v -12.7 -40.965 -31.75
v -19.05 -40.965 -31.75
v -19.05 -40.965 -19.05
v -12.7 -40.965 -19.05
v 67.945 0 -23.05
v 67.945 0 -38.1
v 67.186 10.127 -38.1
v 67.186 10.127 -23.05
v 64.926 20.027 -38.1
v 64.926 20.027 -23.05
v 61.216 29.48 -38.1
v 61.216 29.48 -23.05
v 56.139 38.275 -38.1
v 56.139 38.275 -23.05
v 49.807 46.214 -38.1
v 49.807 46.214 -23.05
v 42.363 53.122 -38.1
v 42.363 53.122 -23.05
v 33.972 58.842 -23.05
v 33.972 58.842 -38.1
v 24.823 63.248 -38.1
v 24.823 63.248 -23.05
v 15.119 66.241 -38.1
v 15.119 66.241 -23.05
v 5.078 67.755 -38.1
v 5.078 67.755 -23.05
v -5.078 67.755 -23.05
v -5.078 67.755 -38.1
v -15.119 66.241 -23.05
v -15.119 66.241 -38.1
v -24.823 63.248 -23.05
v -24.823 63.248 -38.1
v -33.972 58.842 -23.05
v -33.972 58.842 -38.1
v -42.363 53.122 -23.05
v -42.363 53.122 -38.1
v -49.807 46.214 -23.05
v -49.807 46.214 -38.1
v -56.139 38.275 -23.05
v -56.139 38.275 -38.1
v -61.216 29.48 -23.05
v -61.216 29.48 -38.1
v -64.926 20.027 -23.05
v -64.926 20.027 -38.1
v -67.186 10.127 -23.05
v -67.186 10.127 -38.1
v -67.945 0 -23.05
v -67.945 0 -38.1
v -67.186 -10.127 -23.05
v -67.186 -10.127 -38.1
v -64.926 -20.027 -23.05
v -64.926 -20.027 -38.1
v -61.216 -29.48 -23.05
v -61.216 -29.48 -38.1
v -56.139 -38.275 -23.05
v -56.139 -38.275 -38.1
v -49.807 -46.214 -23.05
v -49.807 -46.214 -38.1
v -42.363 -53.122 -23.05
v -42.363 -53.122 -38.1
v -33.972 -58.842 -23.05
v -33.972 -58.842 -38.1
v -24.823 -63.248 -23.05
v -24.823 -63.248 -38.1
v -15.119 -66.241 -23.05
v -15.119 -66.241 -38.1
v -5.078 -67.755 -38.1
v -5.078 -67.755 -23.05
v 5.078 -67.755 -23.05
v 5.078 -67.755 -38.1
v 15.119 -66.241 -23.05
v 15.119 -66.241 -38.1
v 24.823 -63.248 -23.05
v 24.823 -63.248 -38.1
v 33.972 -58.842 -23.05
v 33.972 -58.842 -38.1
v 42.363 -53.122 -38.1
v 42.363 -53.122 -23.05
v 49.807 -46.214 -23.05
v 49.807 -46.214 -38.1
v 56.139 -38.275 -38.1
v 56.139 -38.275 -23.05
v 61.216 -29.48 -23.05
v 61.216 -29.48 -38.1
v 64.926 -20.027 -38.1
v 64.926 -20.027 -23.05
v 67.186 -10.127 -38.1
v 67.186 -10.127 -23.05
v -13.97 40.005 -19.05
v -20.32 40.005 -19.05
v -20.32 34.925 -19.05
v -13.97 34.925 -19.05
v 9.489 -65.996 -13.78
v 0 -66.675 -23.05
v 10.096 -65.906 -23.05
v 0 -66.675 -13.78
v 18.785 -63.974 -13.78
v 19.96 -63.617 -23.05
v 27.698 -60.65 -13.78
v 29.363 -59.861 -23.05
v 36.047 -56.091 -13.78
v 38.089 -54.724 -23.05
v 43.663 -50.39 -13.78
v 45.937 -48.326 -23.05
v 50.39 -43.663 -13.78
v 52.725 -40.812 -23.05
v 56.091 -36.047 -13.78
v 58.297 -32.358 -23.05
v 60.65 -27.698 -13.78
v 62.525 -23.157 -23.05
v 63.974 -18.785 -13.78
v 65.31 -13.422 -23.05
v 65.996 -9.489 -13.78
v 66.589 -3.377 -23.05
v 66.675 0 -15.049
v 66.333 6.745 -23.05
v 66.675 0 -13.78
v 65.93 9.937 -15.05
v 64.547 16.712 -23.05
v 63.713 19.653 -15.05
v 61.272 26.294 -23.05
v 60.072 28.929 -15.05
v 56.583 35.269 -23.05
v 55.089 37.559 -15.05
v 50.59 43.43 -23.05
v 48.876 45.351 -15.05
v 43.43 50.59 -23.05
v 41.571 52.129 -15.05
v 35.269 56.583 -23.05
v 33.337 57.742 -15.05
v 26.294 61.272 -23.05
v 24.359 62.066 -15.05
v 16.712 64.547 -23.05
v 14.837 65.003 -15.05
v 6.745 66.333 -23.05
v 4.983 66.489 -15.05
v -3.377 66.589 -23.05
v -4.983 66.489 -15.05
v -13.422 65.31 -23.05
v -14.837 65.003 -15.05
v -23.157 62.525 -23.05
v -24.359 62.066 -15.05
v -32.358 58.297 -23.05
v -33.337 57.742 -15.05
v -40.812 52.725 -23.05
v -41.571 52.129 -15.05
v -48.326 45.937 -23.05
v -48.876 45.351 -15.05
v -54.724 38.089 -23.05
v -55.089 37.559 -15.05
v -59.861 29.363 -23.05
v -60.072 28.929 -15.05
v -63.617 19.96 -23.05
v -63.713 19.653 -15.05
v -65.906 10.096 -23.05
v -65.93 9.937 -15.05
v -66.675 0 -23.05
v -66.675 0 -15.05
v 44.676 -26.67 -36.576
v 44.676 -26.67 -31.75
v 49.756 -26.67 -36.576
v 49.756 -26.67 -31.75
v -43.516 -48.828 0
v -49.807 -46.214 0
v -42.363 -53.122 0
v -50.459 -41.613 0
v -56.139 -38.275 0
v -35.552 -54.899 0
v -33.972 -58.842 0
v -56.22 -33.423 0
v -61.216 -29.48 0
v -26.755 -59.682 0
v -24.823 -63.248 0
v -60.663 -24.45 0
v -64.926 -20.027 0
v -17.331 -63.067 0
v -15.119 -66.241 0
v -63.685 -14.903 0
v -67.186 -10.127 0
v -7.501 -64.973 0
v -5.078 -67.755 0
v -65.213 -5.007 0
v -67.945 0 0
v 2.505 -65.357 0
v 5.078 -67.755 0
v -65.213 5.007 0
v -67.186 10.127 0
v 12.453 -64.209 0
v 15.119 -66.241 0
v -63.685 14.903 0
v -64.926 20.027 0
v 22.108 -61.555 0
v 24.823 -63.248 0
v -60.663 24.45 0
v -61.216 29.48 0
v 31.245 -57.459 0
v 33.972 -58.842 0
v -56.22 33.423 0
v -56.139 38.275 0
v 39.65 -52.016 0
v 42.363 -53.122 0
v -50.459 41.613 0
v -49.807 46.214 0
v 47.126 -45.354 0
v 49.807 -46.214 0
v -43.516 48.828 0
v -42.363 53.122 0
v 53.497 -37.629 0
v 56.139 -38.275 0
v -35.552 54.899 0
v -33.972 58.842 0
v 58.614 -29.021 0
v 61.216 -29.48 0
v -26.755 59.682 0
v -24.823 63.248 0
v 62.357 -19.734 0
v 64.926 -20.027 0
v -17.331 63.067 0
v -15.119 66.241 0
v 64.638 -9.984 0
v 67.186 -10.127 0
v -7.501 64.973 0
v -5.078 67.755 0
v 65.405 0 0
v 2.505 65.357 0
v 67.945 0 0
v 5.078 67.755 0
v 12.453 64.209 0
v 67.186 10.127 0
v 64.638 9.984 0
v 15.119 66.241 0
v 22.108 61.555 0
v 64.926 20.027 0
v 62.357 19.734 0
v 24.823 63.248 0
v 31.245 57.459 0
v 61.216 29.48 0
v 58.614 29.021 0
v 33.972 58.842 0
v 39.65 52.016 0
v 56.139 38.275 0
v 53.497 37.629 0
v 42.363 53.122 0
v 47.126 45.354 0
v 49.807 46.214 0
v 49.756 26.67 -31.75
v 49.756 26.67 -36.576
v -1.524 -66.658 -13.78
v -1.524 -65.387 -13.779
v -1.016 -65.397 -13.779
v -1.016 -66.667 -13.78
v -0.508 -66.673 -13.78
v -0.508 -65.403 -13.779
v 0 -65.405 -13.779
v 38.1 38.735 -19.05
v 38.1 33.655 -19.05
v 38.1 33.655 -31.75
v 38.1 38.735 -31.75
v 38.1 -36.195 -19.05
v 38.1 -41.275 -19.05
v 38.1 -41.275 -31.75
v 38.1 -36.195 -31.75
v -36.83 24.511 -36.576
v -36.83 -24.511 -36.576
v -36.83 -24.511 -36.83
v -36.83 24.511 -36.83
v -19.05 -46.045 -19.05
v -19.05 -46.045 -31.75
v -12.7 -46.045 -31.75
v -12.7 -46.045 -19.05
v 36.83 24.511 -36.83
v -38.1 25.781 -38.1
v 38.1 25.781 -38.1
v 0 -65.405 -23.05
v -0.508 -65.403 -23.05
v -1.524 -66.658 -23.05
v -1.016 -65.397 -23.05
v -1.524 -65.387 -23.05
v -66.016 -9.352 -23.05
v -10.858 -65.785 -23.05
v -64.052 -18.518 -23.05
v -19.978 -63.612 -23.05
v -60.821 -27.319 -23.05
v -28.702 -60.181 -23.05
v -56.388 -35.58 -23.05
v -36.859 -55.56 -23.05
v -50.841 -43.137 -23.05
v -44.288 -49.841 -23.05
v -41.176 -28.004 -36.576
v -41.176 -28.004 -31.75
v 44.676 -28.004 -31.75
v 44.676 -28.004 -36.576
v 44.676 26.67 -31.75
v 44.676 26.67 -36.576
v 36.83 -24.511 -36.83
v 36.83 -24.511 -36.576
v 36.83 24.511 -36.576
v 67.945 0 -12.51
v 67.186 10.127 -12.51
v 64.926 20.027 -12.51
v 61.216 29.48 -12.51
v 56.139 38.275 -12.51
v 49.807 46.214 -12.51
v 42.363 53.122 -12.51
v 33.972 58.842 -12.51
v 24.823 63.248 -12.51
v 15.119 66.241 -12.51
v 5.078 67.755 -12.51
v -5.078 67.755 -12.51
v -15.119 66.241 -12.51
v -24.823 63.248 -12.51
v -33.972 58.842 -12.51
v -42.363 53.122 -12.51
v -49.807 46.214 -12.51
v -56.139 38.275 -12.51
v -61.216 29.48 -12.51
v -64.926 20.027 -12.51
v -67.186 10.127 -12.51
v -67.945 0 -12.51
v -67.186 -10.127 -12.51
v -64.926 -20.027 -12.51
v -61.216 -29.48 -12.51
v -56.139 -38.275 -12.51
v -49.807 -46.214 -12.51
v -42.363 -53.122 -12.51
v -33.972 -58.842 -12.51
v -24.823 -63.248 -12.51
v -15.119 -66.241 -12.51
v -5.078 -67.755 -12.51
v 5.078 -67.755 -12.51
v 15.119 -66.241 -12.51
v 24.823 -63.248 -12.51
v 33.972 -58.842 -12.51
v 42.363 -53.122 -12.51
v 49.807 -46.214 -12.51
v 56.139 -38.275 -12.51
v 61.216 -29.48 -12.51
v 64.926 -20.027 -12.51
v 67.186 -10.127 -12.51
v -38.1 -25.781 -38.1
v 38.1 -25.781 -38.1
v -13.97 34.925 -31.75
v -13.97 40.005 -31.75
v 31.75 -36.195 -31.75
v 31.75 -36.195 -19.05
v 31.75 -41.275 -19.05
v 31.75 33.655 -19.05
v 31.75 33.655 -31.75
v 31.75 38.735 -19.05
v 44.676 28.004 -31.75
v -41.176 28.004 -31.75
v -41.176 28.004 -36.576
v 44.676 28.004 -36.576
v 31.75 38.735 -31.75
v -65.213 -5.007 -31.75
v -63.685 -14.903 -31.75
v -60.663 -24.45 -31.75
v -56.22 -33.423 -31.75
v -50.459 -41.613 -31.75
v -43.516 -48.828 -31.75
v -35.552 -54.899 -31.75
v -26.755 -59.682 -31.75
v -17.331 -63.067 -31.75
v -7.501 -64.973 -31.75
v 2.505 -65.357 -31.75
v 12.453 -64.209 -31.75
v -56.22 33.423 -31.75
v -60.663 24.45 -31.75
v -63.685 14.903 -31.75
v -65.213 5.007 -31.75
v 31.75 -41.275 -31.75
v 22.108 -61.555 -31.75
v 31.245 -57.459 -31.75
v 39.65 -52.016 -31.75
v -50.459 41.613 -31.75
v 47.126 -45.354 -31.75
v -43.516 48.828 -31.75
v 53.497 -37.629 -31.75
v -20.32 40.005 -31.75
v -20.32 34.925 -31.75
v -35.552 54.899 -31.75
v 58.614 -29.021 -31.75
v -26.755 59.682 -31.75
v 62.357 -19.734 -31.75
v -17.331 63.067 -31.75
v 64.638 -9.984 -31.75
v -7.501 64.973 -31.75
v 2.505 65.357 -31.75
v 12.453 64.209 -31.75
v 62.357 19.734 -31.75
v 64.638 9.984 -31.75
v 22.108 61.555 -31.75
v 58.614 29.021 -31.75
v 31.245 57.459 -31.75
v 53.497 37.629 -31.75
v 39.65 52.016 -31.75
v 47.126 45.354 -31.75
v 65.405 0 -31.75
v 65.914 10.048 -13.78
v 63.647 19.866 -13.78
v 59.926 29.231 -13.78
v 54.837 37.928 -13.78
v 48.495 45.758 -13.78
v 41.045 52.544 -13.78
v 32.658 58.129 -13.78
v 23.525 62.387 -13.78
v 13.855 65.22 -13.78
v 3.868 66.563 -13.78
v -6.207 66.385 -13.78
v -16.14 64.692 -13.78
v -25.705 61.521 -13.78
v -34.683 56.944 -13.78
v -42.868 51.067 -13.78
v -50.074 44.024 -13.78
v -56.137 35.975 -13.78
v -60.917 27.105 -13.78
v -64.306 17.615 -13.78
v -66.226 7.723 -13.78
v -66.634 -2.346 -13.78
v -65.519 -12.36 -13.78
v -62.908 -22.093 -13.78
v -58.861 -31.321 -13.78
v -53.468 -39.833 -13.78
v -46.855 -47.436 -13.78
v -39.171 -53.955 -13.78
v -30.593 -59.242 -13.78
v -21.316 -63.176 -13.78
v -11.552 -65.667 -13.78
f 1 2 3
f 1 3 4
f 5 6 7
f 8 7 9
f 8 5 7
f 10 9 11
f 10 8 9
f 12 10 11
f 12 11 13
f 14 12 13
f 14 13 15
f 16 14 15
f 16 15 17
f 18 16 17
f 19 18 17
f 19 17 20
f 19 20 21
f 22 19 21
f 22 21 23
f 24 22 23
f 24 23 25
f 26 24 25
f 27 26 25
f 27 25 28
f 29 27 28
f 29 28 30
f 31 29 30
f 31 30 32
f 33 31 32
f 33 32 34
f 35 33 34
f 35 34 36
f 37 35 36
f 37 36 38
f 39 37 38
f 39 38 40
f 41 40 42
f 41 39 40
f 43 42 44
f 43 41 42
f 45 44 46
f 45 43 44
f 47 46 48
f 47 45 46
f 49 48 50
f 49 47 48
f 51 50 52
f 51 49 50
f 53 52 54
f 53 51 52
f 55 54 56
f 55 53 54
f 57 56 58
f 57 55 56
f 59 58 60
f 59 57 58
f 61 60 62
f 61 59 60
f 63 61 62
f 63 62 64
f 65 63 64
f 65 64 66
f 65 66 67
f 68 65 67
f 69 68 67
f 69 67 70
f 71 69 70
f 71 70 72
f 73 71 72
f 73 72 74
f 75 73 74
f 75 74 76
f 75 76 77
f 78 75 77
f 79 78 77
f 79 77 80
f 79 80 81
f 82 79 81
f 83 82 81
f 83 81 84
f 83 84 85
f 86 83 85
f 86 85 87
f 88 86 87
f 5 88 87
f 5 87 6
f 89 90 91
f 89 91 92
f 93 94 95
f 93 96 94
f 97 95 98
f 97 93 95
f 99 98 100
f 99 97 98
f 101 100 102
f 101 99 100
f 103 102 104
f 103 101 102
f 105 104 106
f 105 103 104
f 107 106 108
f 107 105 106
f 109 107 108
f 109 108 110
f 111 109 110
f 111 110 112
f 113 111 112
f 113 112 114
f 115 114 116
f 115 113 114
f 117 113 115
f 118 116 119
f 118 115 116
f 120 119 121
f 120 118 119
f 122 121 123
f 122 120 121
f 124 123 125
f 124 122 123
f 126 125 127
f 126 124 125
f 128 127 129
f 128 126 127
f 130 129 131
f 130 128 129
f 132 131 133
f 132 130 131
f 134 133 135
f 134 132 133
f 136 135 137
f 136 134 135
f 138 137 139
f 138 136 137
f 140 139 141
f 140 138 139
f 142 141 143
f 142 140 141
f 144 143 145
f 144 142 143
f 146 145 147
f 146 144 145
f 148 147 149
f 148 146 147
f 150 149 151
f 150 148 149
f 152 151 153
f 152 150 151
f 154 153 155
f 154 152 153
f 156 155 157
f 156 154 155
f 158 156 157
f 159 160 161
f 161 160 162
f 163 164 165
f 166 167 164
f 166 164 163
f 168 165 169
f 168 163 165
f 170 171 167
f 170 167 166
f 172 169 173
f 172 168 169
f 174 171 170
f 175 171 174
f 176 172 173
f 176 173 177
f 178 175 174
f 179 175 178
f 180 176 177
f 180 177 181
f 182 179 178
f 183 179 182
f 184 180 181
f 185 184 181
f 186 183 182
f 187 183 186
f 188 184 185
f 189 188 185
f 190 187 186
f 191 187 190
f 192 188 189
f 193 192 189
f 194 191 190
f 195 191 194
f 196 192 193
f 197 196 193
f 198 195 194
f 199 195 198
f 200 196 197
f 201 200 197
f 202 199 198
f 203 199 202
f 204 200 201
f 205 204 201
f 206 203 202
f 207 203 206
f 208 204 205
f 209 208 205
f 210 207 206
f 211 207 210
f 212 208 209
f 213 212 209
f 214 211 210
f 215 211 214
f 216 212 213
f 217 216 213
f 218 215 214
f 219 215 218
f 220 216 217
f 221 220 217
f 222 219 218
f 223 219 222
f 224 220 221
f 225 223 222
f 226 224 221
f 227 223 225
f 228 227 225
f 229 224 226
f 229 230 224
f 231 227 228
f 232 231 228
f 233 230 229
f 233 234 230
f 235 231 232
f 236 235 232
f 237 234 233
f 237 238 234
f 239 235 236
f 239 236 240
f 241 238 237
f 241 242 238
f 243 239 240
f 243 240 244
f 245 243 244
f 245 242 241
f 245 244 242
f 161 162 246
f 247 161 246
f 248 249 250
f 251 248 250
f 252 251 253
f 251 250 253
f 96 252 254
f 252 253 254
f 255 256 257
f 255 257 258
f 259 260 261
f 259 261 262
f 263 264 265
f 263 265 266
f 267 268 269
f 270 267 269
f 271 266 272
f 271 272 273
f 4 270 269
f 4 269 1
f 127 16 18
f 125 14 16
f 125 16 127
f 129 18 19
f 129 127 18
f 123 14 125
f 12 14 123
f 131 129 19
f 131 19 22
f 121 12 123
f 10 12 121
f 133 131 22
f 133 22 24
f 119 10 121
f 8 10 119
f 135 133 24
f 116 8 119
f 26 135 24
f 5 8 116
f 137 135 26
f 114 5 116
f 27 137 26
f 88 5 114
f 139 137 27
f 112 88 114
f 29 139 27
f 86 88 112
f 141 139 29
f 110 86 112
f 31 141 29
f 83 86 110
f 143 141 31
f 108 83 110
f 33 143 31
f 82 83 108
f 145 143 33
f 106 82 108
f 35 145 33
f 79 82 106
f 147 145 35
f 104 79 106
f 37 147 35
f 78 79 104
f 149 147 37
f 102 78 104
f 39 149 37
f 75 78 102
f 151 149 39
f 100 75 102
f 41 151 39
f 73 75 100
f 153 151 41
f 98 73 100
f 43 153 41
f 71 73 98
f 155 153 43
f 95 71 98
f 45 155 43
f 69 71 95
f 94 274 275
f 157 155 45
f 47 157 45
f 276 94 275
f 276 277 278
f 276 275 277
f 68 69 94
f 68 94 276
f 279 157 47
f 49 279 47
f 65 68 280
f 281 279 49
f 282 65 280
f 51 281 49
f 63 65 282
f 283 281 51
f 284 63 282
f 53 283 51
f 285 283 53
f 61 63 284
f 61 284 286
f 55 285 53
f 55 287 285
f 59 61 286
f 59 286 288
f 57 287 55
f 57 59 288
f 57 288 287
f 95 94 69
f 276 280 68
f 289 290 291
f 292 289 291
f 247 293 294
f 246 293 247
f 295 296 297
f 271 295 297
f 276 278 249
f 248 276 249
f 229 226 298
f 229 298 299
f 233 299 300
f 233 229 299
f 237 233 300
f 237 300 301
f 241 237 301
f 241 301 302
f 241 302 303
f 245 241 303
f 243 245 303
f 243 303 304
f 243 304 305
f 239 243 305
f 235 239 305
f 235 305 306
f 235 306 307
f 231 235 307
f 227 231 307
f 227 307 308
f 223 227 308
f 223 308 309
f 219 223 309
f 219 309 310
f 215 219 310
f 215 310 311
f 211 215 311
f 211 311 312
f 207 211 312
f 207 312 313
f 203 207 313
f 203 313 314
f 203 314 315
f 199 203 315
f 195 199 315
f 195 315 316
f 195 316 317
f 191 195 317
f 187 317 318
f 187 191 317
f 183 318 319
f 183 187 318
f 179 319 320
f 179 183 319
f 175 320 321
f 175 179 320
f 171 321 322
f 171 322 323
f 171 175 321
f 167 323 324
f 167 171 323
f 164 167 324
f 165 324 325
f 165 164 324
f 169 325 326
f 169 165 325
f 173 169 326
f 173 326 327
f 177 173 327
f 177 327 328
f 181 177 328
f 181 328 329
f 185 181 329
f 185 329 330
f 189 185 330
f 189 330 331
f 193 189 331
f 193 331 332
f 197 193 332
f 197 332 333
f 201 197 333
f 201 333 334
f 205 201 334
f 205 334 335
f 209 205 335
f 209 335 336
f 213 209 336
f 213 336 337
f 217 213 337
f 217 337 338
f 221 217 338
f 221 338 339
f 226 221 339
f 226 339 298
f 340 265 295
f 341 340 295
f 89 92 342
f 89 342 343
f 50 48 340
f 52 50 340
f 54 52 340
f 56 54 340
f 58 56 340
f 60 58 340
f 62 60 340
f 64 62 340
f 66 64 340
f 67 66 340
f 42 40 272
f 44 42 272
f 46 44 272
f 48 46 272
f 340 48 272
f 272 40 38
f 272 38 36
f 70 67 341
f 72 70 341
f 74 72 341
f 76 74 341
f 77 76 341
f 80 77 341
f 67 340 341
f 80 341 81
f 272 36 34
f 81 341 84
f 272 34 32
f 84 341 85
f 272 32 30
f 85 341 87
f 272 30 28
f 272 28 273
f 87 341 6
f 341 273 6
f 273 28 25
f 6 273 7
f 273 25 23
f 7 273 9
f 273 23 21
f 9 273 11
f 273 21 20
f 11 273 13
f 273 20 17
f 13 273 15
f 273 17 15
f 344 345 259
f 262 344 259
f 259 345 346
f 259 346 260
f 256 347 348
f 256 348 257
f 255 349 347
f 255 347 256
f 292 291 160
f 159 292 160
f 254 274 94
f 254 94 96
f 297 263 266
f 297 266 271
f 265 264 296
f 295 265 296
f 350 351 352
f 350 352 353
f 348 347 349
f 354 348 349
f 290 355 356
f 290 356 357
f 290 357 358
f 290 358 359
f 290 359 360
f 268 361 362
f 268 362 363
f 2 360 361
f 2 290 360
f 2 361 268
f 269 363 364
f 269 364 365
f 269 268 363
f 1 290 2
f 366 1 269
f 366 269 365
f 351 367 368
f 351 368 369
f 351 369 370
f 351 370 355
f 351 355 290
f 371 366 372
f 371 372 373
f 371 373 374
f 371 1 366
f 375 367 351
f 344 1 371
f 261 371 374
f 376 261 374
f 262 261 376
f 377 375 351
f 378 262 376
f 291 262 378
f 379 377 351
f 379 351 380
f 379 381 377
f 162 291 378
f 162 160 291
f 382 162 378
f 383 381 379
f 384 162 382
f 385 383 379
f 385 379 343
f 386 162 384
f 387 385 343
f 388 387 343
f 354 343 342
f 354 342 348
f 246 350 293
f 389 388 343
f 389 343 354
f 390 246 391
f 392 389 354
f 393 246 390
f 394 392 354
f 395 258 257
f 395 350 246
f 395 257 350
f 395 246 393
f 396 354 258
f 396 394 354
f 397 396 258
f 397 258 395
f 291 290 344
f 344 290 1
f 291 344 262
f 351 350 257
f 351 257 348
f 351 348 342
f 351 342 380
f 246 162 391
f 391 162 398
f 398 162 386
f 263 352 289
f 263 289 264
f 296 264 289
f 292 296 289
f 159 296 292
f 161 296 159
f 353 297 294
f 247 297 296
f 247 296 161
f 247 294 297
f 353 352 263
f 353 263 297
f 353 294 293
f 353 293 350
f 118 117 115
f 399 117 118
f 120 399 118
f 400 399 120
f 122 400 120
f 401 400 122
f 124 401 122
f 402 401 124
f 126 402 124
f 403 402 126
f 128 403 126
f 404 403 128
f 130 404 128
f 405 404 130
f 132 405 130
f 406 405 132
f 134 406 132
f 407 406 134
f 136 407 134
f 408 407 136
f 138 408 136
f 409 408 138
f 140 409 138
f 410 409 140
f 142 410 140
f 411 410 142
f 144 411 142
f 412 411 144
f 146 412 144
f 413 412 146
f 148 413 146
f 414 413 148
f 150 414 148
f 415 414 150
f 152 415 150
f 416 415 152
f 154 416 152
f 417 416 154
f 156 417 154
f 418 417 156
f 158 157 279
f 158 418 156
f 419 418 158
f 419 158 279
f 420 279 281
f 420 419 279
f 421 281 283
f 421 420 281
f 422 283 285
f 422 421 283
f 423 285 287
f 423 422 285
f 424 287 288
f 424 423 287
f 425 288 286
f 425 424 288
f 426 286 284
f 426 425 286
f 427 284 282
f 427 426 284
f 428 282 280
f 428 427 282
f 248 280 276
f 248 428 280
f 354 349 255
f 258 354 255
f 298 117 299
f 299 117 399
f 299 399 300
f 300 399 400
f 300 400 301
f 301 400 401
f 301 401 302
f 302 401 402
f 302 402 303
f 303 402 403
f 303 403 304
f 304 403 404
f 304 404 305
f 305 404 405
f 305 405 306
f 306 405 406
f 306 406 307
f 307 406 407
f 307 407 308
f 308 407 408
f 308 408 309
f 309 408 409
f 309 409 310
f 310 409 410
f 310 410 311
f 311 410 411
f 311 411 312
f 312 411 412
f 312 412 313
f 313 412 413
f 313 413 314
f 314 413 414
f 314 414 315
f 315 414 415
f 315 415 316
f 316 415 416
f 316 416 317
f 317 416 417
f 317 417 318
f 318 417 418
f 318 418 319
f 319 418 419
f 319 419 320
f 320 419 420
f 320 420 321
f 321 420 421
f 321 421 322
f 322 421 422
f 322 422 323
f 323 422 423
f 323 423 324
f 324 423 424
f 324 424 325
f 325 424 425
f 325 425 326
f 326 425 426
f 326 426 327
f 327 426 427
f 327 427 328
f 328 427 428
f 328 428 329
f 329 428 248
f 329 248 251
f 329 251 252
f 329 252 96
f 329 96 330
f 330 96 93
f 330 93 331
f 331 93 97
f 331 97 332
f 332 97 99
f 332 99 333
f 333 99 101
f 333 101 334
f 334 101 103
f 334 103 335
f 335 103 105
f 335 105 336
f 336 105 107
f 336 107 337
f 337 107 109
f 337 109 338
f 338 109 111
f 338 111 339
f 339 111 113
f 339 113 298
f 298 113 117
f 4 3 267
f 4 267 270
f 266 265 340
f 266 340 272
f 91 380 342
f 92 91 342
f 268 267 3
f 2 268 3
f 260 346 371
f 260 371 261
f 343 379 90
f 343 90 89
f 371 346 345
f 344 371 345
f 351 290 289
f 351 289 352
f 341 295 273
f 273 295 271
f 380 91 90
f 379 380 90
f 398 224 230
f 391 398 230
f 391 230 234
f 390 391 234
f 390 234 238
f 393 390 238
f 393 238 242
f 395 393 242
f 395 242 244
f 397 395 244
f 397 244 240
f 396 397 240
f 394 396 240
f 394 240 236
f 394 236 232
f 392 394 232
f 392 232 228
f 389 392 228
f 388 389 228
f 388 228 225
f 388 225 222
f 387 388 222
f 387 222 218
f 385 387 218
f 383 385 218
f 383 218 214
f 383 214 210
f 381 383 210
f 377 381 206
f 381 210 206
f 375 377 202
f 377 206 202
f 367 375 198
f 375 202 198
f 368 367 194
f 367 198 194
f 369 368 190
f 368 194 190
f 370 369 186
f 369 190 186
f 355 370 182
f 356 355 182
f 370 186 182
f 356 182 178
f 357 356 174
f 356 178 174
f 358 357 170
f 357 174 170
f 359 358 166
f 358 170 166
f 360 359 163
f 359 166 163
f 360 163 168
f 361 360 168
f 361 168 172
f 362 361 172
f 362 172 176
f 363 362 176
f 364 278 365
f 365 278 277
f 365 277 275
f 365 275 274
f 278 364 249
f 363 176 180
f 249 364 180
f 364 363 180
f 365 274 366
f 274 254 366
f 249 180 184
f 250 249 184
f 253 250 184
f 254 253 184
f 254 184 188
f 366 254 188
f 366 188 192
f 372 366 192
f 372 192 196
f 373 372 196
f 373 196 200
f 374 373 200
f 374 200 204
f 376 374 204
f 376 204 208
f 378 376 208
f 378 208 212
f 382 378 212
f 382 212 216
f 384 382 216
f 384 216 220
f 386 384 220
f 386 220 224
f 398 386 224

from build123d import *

# Parameters (mm, degrees)
F0_R        = 67.945
F1_DEPTH    = 38.1
F2_R        = 65.405
F3_DEPTH    = 31.75
F5_W        = 2.54
F5_H        = 8.001
F7_S5_R     = 66.675
F7_T6_DEPTH = 98
F8_W        = 73.66
F8_H        = 49.022
F9_DEPTH    = 6.351
F10_W       = 85.852
F10_H       = 56.007
F11_DEPTH   = 4.826
F12_W       = 5.08
F12_H       = 53.34
F13_DEPTH   = 4.826
F14_SIZE    = 1.27
F15_W       = 1.524
F15_H       = 9.271
F16_DEPTH   = 67.946
F17_W       = 6.35
F17_H       = 5.08
F18_DEPTH   = 12.7


# Not quite as in the source:
# - a fillet or chamfer that OpenCascade refuses, or shapes differently, is made with other operations: its cross-section is extruded or revolved along the edge and cut away or added


with BuildPart() as f1:
    # F0 (on Top) → F1 (new body)
    with BuildSketch(Plane.XY):
        Circle(F0_R)
    extrude(amount=-F1_DEPTH)

    # F2 (on face) → F3 (cut)
    with BuildSketch(Plane.XY):
        Circle(F2_R)
    extrude(amount=-F3_DEPTH, mode=Mode.SUBTRACT)

    # F5 (on Front) → F6 (revolve, cut)
    with BuildSketch(Plane.XZ):
        with Locations((-67.945, -19.05)):
            Rectangle(F5_W, F5_H)
    revolve(axis=Axis((0, 0, 0), (0, 0, 1)), mode=Mode.SUBTRACT)

    # F7: chamfer of 2.54 on 1 edges, made by hand


with BuildPart() as f7_tool2:
    # F7_s3 → F7_t4 (revolve)
    with BuildSketch(Plane.XZ):
        Polygon((67.945, -12.5095), (65.405, -15.0495), (67.945, -15.0495), align=None)
    revolve(axis=Axis((0, 0, -15.0495), (0, 0, 1)))

    # F7_s5 → F7_t6 (cut, symmetric)
    with BuildSketch(Plane.XY.offset(-13.8)):
        Circle(F7_S5_R)
    extrude(amount=F7_T6_DEPTH, both=True, mode=Mode.SUBTRACT)


with BuildPart() as f1_1:
    add(f1.part)

    # F7_t1: cut F7_tool2
    add(f7_tool2.part, mode=Mode.SUBTRACT)

    # F8 (on face) → F9 (cut, through all)
    with BuildSketch(Plane.XY.offset(-31.75)):
        Rectangle(F8_W, F8_H)
    extrude(amount=-F9_DEPTH, mode=Mode.SUBTRACT)

    # F10 (on face) → F11 (cut, through all)
    with BuildSketch(Plane.XY.offset(-31.75)):
        with Locations((1.75, 0)):
            Rectangle(F10_W, F10_H)
    extrude(amount=-F11_DEPTH, mode=Mode.SUBTRACT)

    # F12 (on face) → F13 (cut, through all)
    with BuildSketch(Plane.XY.offset(-31.75)):
        with Locations((47.216, 0)):
            Rectangle(F12_W, F12_H)
    extrude(amount=-F13_DEPTH, mode=Mode.SUBTRACT)

    # F14
    f14_edges = [f1_1.edges().sort_by_distance(p)[0] for p in [
        (0, 24.511, -38.1),
        (-36.83, 0, -38.1),
        (36.83, 0, -38.1),
        (0, -24.511, -38.1),
    ]]
    chamfer(f14_edges, length=F14_SIZE)

    # F15 (on Front) → F16 (cut, through all)
    with BuildSketch(Plane.XZ):
        with Locations((-0.762, -18.415)):
            Rectangle(F15_W, F15_H)
    extrude(amount=F16_DEPTH, mode=Mode.SUBTRACT)

    # F17 (on face) → F18 (join)
    with BuildSketch(Plane.XY.offset(-31.75)):
        with Locations((-17.145, 37.465)):
            Rectangle(F17_W, F17_H)
        with Locations((34.925, 36.195)):
            Rectangle(F17_W, F17_H)
        with Locations((-15.875, -43.505)):
            Rectangle(F17_W, F17_H)
        with Locations((34.925, -38.735)):
            Rectangle(F17_W, F17_H)
    extrude(amount=F18_DEPTH)


solid = f1_1.part
